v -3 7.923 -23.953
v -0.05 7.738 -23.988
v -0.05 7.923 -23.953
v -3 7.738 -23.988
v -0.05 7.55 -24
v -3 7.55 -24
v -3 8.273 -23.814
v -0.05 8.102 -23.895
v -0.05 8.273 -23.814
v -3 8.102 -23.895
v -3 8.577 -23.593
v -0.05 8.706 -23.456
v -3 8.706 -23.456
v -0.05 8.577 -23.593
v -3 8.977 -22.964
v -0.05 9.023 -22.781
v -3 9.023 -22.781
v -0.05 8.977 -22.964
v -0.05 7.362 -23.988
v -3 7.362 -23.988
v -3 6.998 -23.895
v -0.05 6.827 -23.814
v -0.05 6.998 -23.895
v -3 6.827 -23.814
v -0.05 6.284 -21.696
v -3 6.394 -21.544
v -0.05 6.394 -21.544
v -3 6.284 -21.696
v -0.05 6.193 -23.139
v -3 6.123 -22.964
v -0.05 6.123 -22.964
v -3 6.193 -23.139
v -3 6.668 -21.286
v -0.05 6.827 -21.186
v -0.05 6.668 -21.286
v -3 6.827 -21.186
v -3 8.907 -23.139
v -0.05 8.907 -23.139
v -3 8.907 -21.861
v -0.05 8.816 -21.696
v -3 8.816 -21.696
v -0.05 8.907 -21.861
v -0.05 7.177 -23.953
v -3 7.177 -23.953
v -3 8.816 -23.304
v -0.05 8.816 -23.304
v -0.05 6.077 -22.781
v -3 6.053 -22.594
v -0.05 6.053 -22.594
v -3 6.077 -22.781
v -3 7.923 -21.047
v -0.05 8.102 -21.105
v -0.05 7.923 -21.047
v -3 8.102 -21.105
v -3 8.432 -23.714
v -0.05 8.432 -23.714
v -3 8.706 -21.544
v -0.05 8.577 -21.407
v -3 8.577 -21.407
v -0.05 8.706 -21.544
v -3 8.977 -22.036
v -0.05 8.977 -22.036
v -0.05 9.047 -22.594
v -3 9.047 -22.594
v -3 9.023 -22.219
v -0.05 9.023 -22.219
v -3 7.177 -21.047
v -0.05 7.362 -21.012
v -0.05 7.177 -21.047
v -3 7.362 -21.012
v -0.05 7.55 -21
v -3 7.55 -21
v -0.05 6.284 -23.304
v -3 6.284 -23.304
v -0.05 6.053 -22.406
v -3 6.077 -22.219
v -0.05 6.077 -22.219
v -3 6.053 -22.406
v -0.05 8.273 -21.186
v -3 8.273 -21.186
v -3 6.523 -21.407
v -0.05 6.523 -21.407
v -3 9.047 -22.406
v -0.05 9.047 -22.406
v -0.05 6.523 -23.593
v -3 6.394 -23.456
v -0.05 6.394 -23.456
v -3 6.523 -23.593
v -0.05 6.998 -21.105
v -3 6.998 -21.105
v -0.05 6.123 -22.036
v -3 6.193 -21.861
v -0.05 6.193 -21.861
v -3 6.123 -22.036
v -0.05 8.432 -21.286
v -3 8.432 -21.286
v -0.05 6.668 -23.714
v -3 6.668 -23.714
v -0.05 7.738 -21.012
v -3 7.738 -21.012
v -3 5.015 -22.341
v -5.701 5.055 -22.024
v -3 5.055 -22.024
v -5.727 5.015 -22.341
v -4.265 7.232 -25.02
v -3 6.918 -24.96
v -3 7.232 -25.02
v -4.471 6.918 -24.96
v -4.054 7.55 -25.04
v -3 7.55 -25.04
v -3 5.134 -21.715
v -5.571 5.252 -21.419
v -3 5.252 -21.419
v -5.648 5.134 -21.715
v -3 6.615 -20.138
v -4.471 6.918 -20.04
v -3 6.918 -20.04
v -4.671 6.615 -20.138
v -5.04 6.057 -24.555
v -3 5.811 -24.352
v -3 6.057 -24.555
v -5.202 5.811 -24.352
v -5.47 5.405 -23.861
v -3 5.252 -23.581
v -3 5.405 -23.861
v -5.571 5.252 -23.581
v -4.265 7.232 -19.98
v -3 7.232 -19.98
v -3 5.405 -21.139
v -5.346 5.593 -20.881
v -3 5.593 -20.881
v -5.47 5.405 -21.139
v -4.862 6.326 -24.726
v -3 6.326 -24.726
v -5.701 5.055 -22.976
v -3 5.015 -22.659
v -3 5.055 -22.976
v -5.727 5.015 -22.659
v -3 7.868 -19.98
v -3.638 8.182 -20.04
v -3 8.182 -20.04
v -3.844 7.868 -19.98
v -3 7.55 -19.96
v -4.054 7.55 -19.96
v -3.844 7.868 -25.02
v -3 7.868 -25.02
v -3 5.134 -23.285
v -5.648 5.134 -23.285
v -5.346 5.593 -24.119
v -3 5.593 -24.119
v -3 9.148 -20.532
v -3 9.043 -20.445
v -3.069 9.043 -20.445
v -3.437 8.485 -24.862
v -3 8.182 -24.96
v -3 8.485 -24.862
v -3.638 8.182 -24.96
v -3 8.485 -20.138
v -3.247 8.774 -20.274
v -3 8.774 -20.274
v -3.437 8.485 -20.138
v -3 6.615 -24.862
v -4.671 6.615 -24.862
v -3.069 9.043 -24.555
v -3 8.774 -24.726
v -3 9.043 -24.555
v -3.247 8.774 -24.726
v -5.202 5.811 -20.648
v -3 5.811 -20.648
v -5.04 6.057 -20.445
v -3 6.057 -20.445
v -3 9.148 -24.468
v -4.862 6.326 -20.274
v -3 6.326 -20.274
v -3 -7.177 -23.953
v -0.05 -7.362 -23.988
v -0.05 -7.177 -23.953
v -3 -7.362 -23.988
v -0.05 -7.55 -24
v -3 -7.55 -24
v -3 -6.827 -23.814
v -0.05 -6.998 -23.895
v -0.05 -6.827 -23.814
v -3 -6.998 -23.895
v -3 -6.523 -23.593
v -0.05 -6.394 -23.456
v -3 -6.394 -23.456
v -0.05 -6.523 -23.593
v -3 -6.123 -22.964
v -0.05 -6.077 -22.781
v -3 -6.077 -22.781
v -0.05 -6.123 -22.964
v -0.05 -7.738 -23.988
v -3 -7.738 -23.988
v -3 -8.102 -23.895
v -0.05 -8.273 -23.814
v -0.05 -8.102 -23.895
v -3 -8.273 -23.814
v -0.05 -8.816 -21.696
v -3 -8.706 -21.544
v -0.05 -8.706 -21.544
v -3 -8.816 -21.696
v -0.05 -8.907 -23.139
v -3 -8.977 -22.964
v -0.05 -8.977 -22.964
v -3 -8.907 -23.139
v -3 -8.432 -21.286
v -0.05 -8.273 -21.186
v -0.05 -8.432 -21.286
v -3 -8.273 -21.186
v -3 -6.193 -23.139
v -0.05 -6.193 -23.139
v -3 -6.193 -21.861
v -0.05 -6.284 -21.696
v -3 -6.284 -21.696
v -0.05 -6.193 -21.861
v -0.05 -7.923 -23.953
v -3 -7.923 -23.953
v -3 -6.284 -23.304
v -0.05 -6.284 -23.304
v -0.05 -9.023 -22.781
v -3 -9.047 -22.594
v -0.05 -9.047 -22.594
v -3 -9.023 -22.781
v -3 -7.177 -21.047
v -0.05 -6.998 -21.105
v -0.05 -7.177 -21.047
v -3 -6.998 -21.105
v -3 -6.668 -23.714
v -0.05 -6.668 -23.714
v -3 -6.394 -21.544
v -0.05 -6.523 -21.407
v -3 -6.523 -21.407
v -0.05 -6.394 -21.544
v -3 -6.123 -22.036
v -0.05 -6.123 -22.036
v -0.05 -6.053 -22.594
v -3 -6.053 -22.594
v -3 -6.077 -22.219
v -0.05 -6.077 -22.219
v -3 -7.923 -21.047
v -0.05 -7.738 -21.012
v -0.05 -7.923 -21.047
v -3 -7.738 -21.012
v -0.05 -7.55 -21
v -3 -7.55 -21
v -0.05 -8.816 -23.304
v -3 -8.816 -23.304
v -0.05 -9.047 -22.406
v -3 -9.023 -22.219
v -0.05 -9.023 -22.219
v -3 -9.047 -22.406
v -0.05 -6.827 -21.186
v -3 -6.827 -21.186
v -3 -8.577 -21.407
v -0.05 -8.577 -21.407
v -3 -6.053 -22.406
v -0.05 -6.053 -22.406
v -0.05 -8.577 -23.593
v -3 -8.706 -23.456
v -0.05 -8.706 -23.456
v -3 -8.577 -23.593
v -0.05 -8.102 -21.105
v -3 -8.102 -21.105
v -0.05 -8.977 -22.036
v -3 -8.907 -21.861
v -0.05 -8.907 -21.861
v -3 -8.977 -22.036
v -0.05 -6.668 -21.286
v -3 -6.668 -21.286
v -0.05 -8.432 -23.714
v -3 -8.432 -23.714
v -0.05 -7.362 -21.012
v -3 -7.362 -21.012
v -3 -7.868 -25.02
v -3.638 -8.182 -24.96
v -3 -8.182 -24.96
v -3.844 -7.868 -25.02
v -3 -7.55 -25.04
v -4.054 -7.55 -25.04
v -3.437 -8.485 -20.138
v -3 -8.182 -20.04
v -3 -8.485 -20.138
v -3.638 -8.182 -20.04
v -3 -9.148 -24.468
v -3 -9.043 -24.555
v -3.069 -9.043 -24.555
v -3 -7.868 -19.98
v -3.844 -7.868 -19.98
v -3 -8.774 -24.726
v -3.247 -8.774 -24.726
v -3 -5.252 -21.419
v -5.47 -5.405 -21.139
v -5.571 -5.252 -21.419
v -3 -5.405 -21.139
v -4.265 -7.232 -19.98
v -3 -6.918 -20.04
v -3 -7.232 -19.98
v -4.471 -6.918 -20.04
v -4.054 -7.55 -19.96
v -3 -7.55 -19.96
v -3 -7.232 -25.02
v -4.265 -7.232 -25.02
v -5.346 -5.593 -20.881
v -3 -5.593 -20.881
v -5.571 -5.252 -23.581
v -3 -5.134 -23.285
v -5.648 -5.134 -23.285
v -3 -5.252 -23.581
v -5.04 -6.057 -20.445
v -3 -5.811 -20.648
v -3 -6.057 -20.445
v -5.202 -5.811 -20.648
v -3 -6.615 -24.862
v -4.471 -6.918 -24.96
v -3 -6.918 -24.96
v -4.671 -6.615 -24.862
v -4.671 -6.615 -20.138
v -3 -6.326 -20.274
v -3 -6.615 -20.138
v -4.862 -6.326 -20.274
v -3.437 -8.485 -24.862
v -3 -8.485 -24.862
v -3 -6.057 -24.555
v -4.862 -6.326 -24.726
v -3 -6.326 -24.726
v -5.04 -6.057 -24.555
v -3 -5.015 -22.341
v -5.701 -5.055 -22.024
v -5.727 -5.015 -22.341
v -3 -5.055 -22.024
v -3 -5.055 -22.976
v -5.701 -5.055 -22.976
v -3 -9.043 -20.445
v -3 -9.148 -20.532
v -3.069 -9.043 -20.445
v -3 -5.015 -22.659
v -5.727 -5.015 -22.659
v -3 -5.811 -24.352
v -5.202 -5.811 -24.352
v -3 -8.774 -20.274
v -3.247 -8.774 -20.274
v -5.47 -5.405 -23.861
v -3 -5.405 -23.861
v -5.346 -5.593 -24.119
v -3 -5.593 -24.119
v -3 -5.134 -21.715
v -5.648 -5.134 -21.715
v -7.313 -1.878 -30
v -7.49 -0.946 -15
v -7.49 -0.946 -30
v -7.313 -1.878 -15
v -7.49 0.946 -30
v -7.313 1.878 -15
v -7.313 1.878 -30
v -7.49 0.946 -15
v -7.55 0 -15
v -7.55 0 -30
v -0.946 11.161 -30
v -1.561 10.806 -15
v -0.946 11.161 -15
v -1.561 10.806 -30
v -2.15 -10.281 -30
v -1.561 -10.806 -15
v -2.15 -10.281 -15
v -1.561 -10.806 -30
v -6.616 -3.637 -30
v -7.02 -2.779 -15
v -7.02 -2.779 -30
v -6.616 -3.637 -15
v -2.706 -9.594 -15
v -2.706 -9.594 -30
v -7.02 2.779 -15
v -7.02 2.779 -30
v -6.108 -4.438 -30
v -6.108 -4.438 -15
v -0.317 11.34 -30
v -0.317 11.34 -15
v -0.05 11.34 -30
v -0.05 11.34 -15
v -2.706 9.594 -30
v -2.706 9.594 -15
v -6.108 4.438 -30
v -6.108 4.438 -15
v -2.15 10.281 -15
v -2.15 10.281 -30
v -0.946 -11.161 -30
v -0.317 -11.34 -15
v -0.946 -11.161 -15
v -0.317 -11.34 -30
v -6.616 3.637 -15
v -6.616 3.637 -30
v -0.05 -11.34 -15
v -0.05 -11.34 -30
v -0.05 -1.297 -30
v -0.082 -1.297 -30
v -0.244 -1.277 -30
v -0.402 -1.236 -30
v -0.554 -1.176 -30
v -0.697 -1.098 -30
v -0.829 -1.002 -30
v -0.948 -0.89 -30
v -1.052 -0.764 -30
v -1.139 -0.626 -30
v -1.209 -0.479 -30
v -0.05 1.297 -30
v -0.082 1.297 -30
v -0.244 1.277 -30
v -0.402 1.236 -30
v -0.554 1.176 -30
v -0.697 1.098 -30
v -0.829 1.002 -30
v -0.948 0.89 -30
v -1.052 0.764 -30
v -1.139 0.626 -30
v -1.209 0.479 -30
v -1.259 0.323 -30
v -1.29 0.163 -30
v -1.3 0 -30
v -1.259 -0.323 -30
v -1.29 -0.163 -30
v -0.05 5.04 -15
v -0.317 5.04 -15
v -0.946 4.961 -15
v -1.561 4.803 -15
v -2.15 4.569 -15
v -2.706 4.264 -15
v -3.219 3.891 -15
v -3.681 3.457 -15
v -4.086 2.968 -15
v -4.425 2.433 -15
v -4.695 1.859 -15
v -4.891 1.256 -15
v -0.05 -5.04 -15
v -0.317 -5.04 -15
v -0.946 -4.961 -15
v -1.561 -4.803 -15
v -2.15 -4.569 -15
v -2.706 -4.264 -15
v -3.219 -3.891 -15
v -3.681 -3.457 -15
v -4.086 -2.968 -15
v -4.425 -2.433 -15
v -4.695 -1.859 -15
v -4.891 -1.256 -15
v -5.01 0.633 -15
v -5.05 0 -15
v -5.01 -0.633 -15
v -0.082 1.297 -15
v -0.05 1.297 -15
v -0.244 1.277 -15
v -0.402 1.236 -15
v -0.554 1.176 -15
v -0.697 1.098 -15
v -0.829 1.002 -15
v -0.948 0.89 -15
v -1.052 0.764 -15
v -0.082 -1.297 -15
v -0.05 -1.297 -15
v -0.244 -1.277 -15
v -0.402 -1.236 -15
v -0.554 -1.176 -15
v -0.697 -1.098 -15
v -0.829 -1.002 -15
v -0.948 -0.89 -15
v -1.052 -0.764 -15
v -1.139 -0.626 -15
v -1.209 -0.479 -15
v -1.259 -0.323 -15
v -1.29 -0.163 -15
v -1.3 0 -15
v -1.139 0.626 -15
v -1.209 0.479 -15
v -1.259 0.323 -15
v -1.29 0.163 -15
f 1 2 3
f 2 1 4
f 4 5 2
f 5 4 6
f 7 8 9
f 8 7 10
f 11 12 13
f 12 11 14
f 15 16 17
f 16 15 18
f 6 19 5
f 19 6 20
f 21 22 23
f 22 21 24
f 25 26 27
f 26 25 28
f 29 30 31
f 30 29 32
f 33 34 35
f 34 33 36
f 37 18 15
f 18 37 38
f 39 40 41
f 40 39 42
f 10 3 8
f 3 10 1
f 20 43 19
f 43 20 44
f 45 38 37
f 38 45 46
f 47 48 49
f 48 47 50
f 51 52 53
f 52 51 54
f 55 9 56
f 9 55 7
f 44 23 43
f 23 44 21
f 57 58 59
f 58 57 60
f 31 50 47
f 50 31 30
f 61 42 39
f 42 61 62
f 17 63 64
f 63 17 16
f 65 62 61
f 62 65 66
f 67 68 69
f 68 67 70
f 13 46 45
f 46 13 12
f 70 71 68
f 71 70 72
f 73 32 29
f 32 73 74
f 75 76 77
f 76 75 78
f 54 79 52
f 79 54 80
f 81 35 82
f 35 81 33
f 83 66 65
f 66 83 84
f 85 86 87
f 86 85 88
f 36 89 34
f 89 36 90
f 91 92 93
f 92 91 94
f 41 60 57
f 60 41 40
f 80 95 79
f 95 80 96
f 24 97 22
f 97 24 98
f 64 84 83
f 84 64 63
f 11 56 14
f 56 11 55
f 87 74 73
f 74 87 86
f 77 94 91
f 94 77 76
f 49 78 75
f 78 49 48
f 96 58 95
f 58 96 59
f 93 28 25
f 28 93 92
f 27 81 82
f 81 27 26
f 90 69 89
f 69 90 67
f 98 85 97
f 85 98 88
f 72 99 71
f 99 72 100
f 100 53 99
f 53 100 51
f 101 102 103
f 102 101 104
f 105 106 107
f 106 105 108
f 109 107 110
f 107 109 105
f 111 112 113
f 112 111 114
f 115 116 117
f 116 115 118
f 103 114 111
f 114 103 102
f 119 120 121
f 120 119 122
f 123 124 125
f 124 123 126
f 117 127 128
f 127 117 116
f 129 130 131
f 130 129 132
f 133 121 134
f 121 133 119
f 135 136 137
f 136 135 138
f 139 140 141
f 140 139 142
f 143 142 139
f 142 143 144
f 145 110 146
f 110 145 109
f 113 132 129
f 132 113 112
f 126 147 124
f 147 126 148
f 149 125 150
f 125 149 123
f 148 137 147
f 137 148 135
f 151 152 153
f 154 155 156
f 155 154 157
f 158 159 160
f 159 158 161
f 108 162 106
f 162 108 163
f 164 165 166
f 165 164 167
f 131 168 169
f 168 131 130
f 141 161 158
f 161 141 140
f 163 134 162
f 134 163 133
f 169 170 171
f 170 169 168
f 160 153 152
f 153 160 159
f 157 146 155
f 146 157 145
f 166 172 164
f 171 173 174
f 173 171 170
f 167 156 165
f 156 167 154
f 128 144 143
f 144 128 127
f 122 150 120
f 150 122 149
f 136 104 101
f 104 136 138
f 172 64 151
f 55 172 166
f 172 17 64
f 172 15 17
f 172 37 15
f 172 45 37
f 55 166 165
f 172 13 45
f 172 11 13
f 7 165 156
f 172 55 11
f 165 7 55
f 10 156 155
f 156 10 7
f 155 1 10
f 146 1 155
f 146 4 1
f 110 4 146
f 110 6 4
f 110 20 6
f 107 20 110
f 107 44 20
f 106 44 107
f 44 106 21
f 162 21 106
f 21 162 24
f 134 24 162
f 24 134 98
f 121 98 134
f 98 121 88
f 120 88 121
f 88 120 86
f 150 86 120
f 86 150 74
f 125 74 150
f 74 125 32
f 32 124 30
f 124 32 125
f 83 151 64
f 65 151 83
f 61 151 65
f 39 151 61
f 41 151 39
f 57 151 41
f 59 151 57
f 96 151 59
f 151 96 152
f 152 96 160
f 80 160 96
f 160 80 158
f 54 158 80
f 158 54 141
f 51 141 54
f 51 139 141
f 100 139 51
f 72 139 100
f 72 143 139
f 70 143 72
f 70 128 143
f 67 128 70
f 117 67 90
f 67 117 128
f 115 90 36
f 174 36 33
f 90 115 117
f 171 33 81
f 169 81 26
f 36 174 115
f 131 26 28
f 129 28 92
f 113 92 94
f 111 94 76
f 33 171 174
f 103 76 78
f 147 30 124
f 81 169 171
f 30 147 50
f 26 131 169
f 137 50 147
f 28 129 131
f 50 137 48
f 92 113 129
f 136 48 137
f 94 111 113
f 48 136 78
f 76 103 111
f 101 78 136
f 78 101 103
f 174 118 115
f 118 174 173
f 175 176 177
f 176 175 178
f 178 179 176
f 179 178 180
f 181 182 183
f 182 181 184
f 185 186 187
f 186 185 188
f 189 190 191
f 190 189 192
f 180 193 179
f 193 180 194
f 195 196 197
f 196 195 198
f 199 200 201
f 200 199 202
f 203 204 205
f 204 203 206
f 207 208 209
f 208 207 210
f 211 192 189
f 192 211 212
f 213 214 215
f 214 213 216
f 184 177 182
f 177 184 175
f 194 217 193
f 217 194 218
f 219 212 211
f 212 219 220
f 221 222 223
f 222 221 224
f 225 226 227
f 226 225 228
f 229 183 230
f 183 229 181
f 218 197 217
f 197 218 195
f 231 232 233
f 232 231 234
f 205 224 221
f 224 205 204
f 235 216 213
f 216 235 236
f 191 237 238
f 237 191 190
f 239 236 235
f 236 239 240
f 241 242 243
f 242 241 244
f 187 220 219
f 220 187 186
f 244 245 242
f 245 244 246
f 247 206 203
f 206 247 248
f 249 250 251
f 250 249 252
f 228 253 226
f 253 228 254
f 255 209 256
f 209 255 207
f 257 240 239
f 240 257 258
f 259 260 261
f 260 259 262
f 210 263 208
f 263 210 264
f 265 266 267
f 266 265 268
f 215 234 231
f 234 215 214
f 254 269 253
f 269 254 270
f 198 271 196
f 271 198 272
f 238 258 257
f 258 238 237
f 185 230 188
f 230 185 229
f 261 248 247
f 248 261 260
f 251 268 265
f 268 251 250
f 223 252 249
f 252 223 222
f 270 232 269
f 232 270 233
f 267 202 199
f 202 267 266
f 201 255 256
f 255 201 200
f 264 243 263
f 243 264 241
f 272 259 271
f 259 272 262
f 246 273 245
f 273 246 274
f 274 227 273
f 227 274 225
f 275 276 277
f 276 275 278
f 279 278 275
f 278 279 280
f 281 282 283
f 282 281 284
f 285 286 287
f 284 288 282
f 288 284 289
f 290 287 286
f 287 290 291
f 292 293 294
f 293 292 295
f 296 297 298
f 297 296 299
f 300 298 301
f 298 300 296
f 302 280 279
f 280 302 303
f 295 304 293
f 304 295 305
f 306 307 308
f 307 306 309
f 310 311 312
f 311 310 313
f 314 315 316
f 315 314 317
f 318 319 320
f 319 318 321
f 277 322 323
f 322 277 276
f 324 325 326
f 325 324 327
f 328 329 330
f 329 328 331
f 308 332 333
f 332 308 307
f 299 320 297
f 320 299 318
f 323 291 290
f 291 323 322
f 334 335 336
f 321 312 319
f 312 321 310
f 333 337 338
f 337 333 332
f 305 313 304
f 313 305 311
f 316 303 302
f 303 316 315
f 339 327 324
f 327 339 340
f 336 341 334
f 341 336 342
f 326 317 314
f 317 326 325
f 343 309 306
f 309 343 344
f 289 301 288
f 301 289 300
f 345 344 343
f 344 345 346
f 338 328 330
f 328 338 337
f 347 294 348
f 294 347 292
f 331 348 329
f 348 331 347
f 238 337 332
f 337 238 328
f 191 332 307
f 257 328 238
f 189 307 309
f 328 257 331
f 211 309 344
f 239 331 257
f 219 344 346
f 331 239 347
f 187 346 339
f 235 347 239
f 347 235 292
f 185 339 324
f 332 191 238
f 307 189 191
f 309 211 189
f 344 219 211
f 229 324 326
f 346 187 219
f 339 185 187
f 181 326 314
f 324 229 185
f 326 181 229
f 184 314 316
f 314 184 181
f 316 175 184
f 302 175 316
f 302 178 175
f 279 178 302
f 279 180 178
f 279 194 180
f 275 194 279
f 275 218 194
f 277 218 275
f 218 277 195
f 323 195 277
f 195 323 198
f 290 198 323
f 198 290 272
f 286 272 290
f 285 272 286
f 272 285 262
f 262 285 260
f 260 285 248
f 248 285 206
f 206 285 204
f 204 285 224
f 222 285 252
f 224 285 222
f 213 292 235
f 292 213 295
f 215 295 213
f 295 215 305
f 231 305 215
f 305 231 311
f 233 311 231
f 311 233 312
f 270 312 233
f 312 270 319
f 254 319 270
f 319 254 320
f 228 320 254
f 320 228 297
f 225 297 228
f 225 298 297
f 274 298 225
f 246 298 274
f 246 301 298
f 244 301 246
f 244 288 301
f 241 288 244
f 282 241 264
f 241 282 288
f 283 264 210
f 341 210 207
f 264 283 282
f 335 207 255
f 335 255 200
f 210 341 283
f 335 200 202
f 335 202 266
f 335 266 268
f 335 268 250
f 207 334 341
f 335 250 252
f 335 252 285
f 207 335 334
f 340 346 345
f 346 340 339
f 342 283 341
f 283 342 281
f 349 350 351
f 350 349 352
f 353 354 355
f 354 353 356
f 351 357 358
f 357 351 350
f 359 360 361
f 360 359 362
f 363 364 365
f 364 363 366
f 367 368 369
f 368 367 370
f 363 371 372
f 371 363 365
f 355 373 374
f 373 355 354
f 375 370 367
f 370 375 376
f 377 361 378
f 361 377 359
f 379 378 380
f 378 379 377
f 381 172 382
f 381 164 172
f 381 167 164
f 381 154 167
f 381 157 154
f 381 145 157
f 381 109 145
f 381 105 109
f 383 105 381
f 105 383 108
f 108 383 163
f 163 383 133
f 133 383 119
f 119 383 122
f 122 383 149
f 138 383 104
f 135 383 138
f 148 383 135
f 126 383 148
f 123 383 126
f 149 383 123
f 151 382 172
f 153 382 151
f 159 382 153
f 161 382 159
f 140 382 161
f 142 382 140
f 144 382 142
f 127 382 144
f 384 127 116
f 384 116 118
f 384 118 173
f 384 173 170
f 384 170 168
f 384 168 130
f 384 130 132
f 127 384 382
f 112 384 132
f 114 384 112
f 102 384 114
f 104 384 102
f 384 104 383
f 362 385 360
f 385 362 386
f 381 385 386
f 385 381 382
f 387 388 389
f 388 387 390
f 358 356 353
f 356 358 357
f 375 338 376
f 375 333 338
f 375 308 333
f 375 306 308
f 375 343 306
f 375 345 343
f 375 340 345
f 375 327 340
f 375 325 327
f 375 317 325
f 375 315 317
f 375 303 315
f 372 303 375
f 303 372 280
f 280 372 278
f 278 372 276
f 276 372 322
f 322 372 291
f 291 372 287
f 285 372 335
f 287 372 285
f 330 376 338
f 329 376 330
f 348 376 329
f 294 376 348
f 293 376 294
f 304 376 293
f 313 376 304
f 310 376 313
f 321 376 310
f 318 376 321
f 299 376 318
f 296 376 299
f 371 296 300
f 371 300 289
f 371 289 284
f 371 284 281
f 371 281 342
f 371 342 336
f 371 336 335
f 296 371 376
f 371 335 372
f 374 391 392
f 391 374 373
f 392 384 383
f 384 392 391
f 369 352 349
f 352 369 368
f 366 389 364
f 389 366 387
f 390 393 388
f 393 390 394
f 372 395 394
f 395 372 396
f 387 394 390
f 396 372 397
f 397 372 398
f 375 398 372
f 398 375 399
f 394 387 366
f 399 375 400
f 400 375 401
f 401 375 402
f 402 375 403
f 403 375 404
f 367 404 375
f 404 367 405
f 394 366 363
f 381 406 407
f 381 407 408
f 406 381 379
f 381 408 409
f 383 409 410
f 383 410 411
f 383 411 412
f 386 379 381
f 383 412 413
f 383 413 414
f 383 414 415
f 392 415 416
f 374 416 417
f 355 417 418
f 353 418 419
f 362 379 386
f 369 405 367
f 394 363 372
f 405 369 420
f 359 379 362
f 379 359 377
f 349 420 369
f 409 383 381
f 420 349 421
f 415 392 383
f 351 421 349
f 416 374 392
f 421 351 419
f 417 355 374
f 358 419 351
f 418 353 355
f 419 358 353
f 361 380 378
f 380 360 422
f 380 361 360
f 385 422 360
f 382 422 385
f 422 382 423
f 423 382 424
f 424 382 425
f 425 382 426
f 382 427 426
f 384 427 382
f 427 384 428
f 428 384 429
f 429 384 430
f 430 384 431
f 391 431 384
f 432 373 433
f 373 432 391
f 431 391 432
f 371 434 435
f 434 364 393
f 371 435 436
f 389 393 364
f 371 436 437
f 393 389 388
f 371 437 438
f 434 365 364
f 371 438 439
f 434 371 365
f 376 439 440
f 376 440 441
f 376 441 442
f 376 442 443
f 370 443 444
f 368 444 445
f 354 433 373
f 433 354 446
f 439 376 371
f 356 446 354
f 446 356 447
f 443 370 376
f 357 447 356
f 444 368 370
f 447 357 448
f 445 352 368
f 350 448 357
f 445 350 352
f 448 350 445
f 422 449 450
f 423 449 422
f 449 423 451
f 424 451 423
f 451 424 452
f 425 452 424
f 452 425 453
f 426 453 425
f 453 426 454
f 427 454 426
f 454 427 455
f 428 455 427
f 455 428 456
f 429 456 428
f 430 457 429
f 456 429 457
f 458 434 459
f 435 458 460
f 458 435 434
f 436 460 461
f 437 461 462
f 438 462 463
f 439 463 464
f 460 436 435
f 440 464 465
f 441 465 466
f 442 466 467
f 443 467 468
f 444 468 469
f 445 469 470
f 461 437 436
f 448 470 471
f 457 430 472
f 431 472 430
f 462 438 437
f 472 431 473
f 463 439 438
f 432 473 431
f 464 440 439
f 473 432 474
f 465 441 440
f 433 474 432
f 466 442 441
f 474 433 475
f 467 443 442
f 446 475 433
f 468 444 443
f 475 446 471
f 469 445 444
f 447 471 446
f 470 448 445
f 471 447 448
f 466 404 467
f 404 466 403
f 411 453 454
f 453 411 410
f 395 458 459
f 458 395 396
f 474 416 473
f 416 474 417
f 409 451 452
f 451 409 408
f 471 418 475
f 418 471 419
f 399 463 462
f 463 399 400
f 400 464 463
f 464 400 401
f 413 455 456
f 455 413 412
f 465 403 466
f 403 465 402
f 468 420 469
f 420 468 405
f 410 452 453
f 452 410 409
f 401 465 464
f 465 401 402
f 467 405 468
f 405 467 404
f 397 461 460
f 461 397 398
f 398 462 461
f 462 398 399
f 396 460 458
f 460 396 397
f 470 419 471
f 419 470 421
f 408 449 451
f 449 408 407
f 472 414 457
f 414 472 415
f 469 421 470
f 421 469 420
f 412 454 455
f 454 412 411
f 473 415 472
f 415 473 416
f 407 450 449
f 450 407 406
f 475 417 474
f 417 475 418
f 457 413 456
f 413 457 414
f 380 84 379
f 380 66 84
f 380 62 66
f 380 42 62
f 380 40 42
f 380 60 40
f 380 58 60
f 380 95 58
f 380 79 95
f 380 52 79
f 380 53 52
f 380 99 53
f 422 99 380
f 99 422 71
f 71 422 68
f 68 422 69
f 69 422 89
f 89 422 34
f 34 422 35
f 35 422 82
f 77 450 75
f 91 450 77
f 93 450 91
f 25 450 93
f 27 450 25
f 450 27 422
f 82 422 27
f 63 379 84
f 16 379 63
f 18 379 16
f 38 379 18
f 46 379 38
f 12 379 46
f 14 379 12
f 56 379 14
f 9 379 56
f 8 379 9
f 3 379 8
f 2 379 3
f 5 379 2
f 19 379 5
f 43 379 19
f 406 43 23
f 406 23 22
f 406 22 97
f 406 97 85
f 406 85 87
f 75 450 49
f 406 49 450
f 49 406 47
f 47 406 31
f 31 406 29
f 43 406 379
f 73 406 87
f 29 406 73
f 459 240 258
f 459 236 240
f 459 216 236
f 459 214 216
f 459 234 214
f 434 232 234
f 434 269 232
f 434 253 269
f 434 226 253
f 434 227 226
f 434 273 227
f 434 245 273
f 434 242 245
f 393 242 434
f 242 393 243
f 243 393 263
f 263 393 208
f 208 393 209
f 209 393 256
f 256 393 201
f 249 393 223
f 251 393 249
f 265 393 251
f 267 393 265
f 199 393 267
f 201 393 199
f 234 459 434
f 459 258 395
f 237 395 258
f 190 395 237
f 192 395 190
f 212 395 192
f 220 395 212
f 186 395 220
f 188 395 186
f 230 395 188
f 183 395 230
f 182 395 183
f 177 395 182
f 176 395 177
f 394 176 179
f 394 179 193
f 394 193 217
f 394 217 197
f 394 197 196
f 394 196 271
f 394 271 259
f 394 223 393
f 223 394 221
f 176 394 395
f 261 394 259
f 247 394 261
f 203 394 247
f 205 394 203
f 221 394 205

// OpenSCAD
// clamped top parts

$fn=50;
inch = 25.4;

// params
length = 60;
d_stepper = 10.1;
thickness = 2.5;
d_wire = 1.3;

sp = [0, d_stepper/2+thickness, length/2-5];

module screwhole(){
    union(){
        cylinder(20, r=1.5, center=true);  // fits 4-40
        translate([0,0, 3])
        cylinder(20, r=0.2*inch/2);
        translate([0,0,-3]) rotate([180,0,0])
        cylinder(20, r=0.2*inch/2);
    }
}

module clamp_cylinder(height, scale){
    difference(){
        linear_extrude(height=height)
        hull(){
            circle(r=d_stepper/2 + thickness);
            scale([1,scale]) circle(r=d_stepper/2);
        }
        for (pm=[1,-1]){
            translate([0, (d_stepper/2+thickness)*pm, height/2])
            rotate([0,90,0])
            screwhole();
        }
    }
}

module structure_cylinder(){
    translate([0,0,-15])
    rotate([0, 0, 135])
    rotate_extrude(angle=90)
    square([d_stepper/2 + thickness, 35]);
    //cylinder(h=length, r=d_stepper/2 + thickness, center=true);
}


difference(){
    translate([0,0,-length/2])
    clamp_cylinder(15, 2.25);
    // wire through hole
    cylinder(h=length+1, r=d_wire, center=true);
    translate([0,0,-15]) cylinder(51, r=d_stepper/2);
    translate([length,0,0]) cube(2*length + 0.1, center=true);
}
